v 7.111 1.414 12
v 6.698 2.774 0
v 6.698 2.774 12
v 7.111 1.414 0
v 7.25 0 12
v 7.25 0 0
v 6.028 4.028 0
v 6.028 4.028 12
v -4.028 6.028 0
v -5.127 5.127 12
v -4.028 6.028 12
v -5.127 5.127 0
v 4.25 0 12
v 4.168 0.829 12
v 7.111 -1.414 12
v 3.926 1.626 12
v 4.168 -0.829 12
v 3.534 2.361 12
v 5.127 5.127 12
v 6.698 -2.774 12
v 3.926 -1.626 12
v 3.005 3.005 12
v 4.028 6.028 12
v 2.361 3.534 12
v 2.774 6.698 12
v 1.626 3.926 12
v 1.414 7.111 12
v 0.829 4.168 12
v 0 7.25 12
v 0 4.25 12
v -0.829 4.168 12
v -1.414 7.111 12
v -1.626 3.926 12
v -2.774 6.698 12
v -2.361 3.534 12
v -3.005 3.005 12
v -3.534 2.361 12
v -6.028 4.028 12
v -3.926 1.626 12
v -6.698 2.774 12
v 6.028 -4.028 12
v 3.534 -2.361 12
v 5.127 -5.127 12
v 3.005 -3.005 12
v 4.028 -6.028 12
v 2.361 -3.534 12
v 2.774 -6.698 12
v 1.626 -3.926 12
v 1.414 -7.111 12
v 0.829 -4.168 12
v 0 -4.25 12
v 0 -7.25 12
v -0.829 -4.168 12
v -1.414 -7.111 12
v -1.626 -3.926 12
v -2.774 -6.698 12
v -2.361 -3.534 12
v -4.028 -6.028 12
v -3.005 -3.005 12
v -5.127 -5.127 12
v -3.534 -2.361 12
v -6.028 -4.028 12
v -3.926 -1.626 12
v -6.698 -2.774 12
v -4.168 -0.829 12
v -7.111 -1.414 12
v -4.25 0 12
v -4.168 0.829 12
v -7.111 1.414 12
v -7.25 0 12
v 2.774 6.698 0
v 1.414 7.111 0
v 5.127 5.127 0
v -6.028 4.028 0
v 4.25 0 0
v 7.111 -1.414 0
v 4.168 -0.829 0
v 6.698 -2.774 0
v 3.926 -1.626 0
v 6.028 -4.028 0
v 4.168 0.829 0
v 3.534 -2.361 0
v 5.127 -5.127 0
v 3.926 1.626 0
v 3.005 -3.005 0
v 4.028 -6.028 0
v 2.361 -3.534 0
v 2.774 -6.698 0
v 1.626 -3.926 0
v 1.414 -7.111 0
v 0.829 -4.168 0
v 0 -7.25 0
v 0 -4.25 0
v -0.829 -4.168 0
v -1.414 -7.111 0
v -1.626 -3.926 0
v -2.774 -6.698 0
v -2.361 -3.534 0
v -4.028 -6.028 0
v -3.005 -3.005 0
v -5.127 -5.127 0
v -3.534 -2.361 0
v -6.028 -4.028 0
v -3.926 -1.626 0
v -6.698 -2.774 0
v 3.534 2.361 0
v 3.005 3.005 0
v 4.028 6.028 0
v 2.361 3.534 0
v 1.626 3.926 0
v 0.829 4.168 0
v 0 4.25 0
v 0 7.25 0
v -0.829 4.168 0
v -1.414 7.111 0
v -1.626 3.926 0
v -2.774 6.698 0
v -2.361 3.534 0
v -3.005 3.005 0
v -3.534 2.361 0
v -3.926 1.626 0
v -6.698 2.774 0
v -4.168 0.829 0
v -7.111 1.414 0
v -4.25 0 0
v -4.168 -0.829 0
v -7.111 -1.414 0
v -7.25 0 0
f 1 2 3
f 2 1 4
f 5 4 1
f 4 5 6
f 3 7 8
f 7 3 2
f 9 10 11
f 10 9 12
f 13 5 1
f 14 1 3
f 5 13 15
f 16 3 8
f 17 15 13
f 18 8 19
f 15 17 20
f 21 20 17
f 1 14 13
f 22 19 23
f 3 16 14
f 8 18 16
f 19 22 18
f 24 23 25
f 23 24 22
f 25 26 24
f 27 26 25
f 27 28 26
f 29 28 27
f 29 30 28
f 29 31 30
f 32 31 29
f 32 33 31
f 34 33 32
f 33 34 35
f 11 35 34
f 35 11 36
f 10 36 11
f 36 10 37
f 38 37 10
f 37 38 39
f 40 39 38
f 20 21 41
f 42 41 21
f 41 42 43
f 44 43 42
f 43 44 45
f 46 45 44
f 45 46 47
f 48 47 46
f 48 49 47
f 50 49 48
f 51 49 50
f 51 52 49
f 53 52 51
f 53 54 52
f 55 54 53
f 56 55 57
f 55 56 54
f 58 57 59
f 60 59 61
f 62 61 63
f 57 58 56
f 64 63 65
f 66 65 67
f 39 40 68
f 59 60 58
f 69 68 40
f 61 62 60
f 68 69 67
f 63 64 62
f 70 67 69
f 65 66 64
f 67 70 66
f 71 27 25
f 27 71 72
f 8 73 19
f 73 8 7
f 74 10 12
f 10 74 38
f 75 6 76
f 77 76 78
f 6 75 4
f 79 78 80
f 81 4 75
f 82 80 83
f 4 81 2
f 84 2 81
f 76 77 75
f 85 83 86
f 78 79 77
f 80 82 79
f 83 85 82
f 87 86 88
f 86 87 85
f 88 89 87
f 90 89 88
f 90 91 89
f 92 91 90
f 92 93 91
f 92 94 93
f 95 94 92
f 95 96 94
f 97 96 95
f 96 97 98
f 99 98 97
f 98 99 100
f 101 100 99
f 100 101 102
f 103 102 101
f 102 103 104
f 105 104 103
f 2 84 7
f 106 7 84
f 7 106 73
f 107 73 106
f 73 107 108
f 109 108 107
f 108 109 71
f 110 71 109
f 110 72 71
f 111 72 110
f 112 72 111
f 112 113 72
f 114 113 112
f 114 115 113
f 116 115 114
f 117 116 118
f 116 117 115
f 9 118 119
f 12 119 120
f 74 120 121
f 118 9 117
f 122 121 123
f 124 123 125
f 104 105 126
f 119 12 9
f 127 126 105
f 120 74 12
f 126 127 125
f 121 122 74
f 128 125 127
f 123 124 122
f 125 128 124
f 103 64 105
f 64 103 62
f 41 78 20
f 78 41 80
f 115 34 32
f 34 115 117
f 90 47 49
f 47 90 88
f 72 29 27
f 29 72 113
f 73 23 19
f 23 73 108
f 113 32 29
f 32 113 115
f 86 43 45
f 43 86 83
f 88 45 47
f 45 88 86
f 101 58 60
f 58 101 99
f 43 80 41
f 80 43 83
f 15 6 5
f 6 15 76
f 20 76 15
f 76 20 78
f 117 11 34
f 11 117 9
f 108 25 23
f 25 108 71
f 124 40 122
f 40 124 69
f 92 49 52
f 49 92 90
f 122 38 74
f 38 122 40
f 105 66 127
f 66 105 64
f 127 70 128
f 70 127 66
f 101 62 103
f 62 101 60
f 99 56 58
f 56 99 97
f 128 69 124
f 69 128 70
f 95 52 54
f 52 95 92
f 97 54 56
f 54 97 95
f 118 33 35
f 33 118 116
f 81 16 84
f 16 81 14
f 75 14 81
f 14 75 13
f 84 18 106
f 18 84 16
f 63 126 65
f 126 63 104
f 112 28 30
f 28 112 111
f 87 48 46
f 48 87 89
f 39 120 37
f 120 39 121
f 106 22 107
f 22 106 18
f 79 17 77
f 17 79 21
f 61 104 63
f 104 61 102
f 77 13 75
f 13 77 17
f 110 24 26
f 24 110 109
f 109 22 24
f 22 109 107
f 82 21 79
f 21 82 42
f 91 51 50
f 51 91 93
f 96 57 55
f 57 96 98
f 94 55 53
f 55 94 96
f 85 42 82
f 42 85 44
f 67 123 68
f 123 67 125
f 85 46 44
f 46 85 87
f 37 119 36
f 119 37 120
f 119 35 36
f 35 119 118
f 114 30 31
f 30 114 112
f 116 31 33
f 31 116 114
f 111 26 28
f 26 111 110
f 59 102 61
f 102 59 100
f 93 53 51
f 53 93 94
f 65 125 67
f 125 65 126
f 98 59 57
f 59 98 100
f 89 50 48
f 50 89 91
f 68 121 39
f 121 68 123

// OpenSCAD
$fn = 32;

// ----------------------------------------------------------------------
// Spacer sleeve: 14.5 / 8.5 x 12 mm
// ----------------------------------------------------------------------

// --- parameters (mm) ---
sleeve_od = 14.5;         // outside diameter
sleeve_id = 8.5;          // shaft bore
sleeve_l = 12;            // sleeve length

module sleeve() {
  cylinder(h = sleeve_l, d = sleeve_od);
}

difference() {
  sleeve();
  translate([0, 0, -1]) cylinder(h = sleeve_l + 2, d = sleeve_id);
}
